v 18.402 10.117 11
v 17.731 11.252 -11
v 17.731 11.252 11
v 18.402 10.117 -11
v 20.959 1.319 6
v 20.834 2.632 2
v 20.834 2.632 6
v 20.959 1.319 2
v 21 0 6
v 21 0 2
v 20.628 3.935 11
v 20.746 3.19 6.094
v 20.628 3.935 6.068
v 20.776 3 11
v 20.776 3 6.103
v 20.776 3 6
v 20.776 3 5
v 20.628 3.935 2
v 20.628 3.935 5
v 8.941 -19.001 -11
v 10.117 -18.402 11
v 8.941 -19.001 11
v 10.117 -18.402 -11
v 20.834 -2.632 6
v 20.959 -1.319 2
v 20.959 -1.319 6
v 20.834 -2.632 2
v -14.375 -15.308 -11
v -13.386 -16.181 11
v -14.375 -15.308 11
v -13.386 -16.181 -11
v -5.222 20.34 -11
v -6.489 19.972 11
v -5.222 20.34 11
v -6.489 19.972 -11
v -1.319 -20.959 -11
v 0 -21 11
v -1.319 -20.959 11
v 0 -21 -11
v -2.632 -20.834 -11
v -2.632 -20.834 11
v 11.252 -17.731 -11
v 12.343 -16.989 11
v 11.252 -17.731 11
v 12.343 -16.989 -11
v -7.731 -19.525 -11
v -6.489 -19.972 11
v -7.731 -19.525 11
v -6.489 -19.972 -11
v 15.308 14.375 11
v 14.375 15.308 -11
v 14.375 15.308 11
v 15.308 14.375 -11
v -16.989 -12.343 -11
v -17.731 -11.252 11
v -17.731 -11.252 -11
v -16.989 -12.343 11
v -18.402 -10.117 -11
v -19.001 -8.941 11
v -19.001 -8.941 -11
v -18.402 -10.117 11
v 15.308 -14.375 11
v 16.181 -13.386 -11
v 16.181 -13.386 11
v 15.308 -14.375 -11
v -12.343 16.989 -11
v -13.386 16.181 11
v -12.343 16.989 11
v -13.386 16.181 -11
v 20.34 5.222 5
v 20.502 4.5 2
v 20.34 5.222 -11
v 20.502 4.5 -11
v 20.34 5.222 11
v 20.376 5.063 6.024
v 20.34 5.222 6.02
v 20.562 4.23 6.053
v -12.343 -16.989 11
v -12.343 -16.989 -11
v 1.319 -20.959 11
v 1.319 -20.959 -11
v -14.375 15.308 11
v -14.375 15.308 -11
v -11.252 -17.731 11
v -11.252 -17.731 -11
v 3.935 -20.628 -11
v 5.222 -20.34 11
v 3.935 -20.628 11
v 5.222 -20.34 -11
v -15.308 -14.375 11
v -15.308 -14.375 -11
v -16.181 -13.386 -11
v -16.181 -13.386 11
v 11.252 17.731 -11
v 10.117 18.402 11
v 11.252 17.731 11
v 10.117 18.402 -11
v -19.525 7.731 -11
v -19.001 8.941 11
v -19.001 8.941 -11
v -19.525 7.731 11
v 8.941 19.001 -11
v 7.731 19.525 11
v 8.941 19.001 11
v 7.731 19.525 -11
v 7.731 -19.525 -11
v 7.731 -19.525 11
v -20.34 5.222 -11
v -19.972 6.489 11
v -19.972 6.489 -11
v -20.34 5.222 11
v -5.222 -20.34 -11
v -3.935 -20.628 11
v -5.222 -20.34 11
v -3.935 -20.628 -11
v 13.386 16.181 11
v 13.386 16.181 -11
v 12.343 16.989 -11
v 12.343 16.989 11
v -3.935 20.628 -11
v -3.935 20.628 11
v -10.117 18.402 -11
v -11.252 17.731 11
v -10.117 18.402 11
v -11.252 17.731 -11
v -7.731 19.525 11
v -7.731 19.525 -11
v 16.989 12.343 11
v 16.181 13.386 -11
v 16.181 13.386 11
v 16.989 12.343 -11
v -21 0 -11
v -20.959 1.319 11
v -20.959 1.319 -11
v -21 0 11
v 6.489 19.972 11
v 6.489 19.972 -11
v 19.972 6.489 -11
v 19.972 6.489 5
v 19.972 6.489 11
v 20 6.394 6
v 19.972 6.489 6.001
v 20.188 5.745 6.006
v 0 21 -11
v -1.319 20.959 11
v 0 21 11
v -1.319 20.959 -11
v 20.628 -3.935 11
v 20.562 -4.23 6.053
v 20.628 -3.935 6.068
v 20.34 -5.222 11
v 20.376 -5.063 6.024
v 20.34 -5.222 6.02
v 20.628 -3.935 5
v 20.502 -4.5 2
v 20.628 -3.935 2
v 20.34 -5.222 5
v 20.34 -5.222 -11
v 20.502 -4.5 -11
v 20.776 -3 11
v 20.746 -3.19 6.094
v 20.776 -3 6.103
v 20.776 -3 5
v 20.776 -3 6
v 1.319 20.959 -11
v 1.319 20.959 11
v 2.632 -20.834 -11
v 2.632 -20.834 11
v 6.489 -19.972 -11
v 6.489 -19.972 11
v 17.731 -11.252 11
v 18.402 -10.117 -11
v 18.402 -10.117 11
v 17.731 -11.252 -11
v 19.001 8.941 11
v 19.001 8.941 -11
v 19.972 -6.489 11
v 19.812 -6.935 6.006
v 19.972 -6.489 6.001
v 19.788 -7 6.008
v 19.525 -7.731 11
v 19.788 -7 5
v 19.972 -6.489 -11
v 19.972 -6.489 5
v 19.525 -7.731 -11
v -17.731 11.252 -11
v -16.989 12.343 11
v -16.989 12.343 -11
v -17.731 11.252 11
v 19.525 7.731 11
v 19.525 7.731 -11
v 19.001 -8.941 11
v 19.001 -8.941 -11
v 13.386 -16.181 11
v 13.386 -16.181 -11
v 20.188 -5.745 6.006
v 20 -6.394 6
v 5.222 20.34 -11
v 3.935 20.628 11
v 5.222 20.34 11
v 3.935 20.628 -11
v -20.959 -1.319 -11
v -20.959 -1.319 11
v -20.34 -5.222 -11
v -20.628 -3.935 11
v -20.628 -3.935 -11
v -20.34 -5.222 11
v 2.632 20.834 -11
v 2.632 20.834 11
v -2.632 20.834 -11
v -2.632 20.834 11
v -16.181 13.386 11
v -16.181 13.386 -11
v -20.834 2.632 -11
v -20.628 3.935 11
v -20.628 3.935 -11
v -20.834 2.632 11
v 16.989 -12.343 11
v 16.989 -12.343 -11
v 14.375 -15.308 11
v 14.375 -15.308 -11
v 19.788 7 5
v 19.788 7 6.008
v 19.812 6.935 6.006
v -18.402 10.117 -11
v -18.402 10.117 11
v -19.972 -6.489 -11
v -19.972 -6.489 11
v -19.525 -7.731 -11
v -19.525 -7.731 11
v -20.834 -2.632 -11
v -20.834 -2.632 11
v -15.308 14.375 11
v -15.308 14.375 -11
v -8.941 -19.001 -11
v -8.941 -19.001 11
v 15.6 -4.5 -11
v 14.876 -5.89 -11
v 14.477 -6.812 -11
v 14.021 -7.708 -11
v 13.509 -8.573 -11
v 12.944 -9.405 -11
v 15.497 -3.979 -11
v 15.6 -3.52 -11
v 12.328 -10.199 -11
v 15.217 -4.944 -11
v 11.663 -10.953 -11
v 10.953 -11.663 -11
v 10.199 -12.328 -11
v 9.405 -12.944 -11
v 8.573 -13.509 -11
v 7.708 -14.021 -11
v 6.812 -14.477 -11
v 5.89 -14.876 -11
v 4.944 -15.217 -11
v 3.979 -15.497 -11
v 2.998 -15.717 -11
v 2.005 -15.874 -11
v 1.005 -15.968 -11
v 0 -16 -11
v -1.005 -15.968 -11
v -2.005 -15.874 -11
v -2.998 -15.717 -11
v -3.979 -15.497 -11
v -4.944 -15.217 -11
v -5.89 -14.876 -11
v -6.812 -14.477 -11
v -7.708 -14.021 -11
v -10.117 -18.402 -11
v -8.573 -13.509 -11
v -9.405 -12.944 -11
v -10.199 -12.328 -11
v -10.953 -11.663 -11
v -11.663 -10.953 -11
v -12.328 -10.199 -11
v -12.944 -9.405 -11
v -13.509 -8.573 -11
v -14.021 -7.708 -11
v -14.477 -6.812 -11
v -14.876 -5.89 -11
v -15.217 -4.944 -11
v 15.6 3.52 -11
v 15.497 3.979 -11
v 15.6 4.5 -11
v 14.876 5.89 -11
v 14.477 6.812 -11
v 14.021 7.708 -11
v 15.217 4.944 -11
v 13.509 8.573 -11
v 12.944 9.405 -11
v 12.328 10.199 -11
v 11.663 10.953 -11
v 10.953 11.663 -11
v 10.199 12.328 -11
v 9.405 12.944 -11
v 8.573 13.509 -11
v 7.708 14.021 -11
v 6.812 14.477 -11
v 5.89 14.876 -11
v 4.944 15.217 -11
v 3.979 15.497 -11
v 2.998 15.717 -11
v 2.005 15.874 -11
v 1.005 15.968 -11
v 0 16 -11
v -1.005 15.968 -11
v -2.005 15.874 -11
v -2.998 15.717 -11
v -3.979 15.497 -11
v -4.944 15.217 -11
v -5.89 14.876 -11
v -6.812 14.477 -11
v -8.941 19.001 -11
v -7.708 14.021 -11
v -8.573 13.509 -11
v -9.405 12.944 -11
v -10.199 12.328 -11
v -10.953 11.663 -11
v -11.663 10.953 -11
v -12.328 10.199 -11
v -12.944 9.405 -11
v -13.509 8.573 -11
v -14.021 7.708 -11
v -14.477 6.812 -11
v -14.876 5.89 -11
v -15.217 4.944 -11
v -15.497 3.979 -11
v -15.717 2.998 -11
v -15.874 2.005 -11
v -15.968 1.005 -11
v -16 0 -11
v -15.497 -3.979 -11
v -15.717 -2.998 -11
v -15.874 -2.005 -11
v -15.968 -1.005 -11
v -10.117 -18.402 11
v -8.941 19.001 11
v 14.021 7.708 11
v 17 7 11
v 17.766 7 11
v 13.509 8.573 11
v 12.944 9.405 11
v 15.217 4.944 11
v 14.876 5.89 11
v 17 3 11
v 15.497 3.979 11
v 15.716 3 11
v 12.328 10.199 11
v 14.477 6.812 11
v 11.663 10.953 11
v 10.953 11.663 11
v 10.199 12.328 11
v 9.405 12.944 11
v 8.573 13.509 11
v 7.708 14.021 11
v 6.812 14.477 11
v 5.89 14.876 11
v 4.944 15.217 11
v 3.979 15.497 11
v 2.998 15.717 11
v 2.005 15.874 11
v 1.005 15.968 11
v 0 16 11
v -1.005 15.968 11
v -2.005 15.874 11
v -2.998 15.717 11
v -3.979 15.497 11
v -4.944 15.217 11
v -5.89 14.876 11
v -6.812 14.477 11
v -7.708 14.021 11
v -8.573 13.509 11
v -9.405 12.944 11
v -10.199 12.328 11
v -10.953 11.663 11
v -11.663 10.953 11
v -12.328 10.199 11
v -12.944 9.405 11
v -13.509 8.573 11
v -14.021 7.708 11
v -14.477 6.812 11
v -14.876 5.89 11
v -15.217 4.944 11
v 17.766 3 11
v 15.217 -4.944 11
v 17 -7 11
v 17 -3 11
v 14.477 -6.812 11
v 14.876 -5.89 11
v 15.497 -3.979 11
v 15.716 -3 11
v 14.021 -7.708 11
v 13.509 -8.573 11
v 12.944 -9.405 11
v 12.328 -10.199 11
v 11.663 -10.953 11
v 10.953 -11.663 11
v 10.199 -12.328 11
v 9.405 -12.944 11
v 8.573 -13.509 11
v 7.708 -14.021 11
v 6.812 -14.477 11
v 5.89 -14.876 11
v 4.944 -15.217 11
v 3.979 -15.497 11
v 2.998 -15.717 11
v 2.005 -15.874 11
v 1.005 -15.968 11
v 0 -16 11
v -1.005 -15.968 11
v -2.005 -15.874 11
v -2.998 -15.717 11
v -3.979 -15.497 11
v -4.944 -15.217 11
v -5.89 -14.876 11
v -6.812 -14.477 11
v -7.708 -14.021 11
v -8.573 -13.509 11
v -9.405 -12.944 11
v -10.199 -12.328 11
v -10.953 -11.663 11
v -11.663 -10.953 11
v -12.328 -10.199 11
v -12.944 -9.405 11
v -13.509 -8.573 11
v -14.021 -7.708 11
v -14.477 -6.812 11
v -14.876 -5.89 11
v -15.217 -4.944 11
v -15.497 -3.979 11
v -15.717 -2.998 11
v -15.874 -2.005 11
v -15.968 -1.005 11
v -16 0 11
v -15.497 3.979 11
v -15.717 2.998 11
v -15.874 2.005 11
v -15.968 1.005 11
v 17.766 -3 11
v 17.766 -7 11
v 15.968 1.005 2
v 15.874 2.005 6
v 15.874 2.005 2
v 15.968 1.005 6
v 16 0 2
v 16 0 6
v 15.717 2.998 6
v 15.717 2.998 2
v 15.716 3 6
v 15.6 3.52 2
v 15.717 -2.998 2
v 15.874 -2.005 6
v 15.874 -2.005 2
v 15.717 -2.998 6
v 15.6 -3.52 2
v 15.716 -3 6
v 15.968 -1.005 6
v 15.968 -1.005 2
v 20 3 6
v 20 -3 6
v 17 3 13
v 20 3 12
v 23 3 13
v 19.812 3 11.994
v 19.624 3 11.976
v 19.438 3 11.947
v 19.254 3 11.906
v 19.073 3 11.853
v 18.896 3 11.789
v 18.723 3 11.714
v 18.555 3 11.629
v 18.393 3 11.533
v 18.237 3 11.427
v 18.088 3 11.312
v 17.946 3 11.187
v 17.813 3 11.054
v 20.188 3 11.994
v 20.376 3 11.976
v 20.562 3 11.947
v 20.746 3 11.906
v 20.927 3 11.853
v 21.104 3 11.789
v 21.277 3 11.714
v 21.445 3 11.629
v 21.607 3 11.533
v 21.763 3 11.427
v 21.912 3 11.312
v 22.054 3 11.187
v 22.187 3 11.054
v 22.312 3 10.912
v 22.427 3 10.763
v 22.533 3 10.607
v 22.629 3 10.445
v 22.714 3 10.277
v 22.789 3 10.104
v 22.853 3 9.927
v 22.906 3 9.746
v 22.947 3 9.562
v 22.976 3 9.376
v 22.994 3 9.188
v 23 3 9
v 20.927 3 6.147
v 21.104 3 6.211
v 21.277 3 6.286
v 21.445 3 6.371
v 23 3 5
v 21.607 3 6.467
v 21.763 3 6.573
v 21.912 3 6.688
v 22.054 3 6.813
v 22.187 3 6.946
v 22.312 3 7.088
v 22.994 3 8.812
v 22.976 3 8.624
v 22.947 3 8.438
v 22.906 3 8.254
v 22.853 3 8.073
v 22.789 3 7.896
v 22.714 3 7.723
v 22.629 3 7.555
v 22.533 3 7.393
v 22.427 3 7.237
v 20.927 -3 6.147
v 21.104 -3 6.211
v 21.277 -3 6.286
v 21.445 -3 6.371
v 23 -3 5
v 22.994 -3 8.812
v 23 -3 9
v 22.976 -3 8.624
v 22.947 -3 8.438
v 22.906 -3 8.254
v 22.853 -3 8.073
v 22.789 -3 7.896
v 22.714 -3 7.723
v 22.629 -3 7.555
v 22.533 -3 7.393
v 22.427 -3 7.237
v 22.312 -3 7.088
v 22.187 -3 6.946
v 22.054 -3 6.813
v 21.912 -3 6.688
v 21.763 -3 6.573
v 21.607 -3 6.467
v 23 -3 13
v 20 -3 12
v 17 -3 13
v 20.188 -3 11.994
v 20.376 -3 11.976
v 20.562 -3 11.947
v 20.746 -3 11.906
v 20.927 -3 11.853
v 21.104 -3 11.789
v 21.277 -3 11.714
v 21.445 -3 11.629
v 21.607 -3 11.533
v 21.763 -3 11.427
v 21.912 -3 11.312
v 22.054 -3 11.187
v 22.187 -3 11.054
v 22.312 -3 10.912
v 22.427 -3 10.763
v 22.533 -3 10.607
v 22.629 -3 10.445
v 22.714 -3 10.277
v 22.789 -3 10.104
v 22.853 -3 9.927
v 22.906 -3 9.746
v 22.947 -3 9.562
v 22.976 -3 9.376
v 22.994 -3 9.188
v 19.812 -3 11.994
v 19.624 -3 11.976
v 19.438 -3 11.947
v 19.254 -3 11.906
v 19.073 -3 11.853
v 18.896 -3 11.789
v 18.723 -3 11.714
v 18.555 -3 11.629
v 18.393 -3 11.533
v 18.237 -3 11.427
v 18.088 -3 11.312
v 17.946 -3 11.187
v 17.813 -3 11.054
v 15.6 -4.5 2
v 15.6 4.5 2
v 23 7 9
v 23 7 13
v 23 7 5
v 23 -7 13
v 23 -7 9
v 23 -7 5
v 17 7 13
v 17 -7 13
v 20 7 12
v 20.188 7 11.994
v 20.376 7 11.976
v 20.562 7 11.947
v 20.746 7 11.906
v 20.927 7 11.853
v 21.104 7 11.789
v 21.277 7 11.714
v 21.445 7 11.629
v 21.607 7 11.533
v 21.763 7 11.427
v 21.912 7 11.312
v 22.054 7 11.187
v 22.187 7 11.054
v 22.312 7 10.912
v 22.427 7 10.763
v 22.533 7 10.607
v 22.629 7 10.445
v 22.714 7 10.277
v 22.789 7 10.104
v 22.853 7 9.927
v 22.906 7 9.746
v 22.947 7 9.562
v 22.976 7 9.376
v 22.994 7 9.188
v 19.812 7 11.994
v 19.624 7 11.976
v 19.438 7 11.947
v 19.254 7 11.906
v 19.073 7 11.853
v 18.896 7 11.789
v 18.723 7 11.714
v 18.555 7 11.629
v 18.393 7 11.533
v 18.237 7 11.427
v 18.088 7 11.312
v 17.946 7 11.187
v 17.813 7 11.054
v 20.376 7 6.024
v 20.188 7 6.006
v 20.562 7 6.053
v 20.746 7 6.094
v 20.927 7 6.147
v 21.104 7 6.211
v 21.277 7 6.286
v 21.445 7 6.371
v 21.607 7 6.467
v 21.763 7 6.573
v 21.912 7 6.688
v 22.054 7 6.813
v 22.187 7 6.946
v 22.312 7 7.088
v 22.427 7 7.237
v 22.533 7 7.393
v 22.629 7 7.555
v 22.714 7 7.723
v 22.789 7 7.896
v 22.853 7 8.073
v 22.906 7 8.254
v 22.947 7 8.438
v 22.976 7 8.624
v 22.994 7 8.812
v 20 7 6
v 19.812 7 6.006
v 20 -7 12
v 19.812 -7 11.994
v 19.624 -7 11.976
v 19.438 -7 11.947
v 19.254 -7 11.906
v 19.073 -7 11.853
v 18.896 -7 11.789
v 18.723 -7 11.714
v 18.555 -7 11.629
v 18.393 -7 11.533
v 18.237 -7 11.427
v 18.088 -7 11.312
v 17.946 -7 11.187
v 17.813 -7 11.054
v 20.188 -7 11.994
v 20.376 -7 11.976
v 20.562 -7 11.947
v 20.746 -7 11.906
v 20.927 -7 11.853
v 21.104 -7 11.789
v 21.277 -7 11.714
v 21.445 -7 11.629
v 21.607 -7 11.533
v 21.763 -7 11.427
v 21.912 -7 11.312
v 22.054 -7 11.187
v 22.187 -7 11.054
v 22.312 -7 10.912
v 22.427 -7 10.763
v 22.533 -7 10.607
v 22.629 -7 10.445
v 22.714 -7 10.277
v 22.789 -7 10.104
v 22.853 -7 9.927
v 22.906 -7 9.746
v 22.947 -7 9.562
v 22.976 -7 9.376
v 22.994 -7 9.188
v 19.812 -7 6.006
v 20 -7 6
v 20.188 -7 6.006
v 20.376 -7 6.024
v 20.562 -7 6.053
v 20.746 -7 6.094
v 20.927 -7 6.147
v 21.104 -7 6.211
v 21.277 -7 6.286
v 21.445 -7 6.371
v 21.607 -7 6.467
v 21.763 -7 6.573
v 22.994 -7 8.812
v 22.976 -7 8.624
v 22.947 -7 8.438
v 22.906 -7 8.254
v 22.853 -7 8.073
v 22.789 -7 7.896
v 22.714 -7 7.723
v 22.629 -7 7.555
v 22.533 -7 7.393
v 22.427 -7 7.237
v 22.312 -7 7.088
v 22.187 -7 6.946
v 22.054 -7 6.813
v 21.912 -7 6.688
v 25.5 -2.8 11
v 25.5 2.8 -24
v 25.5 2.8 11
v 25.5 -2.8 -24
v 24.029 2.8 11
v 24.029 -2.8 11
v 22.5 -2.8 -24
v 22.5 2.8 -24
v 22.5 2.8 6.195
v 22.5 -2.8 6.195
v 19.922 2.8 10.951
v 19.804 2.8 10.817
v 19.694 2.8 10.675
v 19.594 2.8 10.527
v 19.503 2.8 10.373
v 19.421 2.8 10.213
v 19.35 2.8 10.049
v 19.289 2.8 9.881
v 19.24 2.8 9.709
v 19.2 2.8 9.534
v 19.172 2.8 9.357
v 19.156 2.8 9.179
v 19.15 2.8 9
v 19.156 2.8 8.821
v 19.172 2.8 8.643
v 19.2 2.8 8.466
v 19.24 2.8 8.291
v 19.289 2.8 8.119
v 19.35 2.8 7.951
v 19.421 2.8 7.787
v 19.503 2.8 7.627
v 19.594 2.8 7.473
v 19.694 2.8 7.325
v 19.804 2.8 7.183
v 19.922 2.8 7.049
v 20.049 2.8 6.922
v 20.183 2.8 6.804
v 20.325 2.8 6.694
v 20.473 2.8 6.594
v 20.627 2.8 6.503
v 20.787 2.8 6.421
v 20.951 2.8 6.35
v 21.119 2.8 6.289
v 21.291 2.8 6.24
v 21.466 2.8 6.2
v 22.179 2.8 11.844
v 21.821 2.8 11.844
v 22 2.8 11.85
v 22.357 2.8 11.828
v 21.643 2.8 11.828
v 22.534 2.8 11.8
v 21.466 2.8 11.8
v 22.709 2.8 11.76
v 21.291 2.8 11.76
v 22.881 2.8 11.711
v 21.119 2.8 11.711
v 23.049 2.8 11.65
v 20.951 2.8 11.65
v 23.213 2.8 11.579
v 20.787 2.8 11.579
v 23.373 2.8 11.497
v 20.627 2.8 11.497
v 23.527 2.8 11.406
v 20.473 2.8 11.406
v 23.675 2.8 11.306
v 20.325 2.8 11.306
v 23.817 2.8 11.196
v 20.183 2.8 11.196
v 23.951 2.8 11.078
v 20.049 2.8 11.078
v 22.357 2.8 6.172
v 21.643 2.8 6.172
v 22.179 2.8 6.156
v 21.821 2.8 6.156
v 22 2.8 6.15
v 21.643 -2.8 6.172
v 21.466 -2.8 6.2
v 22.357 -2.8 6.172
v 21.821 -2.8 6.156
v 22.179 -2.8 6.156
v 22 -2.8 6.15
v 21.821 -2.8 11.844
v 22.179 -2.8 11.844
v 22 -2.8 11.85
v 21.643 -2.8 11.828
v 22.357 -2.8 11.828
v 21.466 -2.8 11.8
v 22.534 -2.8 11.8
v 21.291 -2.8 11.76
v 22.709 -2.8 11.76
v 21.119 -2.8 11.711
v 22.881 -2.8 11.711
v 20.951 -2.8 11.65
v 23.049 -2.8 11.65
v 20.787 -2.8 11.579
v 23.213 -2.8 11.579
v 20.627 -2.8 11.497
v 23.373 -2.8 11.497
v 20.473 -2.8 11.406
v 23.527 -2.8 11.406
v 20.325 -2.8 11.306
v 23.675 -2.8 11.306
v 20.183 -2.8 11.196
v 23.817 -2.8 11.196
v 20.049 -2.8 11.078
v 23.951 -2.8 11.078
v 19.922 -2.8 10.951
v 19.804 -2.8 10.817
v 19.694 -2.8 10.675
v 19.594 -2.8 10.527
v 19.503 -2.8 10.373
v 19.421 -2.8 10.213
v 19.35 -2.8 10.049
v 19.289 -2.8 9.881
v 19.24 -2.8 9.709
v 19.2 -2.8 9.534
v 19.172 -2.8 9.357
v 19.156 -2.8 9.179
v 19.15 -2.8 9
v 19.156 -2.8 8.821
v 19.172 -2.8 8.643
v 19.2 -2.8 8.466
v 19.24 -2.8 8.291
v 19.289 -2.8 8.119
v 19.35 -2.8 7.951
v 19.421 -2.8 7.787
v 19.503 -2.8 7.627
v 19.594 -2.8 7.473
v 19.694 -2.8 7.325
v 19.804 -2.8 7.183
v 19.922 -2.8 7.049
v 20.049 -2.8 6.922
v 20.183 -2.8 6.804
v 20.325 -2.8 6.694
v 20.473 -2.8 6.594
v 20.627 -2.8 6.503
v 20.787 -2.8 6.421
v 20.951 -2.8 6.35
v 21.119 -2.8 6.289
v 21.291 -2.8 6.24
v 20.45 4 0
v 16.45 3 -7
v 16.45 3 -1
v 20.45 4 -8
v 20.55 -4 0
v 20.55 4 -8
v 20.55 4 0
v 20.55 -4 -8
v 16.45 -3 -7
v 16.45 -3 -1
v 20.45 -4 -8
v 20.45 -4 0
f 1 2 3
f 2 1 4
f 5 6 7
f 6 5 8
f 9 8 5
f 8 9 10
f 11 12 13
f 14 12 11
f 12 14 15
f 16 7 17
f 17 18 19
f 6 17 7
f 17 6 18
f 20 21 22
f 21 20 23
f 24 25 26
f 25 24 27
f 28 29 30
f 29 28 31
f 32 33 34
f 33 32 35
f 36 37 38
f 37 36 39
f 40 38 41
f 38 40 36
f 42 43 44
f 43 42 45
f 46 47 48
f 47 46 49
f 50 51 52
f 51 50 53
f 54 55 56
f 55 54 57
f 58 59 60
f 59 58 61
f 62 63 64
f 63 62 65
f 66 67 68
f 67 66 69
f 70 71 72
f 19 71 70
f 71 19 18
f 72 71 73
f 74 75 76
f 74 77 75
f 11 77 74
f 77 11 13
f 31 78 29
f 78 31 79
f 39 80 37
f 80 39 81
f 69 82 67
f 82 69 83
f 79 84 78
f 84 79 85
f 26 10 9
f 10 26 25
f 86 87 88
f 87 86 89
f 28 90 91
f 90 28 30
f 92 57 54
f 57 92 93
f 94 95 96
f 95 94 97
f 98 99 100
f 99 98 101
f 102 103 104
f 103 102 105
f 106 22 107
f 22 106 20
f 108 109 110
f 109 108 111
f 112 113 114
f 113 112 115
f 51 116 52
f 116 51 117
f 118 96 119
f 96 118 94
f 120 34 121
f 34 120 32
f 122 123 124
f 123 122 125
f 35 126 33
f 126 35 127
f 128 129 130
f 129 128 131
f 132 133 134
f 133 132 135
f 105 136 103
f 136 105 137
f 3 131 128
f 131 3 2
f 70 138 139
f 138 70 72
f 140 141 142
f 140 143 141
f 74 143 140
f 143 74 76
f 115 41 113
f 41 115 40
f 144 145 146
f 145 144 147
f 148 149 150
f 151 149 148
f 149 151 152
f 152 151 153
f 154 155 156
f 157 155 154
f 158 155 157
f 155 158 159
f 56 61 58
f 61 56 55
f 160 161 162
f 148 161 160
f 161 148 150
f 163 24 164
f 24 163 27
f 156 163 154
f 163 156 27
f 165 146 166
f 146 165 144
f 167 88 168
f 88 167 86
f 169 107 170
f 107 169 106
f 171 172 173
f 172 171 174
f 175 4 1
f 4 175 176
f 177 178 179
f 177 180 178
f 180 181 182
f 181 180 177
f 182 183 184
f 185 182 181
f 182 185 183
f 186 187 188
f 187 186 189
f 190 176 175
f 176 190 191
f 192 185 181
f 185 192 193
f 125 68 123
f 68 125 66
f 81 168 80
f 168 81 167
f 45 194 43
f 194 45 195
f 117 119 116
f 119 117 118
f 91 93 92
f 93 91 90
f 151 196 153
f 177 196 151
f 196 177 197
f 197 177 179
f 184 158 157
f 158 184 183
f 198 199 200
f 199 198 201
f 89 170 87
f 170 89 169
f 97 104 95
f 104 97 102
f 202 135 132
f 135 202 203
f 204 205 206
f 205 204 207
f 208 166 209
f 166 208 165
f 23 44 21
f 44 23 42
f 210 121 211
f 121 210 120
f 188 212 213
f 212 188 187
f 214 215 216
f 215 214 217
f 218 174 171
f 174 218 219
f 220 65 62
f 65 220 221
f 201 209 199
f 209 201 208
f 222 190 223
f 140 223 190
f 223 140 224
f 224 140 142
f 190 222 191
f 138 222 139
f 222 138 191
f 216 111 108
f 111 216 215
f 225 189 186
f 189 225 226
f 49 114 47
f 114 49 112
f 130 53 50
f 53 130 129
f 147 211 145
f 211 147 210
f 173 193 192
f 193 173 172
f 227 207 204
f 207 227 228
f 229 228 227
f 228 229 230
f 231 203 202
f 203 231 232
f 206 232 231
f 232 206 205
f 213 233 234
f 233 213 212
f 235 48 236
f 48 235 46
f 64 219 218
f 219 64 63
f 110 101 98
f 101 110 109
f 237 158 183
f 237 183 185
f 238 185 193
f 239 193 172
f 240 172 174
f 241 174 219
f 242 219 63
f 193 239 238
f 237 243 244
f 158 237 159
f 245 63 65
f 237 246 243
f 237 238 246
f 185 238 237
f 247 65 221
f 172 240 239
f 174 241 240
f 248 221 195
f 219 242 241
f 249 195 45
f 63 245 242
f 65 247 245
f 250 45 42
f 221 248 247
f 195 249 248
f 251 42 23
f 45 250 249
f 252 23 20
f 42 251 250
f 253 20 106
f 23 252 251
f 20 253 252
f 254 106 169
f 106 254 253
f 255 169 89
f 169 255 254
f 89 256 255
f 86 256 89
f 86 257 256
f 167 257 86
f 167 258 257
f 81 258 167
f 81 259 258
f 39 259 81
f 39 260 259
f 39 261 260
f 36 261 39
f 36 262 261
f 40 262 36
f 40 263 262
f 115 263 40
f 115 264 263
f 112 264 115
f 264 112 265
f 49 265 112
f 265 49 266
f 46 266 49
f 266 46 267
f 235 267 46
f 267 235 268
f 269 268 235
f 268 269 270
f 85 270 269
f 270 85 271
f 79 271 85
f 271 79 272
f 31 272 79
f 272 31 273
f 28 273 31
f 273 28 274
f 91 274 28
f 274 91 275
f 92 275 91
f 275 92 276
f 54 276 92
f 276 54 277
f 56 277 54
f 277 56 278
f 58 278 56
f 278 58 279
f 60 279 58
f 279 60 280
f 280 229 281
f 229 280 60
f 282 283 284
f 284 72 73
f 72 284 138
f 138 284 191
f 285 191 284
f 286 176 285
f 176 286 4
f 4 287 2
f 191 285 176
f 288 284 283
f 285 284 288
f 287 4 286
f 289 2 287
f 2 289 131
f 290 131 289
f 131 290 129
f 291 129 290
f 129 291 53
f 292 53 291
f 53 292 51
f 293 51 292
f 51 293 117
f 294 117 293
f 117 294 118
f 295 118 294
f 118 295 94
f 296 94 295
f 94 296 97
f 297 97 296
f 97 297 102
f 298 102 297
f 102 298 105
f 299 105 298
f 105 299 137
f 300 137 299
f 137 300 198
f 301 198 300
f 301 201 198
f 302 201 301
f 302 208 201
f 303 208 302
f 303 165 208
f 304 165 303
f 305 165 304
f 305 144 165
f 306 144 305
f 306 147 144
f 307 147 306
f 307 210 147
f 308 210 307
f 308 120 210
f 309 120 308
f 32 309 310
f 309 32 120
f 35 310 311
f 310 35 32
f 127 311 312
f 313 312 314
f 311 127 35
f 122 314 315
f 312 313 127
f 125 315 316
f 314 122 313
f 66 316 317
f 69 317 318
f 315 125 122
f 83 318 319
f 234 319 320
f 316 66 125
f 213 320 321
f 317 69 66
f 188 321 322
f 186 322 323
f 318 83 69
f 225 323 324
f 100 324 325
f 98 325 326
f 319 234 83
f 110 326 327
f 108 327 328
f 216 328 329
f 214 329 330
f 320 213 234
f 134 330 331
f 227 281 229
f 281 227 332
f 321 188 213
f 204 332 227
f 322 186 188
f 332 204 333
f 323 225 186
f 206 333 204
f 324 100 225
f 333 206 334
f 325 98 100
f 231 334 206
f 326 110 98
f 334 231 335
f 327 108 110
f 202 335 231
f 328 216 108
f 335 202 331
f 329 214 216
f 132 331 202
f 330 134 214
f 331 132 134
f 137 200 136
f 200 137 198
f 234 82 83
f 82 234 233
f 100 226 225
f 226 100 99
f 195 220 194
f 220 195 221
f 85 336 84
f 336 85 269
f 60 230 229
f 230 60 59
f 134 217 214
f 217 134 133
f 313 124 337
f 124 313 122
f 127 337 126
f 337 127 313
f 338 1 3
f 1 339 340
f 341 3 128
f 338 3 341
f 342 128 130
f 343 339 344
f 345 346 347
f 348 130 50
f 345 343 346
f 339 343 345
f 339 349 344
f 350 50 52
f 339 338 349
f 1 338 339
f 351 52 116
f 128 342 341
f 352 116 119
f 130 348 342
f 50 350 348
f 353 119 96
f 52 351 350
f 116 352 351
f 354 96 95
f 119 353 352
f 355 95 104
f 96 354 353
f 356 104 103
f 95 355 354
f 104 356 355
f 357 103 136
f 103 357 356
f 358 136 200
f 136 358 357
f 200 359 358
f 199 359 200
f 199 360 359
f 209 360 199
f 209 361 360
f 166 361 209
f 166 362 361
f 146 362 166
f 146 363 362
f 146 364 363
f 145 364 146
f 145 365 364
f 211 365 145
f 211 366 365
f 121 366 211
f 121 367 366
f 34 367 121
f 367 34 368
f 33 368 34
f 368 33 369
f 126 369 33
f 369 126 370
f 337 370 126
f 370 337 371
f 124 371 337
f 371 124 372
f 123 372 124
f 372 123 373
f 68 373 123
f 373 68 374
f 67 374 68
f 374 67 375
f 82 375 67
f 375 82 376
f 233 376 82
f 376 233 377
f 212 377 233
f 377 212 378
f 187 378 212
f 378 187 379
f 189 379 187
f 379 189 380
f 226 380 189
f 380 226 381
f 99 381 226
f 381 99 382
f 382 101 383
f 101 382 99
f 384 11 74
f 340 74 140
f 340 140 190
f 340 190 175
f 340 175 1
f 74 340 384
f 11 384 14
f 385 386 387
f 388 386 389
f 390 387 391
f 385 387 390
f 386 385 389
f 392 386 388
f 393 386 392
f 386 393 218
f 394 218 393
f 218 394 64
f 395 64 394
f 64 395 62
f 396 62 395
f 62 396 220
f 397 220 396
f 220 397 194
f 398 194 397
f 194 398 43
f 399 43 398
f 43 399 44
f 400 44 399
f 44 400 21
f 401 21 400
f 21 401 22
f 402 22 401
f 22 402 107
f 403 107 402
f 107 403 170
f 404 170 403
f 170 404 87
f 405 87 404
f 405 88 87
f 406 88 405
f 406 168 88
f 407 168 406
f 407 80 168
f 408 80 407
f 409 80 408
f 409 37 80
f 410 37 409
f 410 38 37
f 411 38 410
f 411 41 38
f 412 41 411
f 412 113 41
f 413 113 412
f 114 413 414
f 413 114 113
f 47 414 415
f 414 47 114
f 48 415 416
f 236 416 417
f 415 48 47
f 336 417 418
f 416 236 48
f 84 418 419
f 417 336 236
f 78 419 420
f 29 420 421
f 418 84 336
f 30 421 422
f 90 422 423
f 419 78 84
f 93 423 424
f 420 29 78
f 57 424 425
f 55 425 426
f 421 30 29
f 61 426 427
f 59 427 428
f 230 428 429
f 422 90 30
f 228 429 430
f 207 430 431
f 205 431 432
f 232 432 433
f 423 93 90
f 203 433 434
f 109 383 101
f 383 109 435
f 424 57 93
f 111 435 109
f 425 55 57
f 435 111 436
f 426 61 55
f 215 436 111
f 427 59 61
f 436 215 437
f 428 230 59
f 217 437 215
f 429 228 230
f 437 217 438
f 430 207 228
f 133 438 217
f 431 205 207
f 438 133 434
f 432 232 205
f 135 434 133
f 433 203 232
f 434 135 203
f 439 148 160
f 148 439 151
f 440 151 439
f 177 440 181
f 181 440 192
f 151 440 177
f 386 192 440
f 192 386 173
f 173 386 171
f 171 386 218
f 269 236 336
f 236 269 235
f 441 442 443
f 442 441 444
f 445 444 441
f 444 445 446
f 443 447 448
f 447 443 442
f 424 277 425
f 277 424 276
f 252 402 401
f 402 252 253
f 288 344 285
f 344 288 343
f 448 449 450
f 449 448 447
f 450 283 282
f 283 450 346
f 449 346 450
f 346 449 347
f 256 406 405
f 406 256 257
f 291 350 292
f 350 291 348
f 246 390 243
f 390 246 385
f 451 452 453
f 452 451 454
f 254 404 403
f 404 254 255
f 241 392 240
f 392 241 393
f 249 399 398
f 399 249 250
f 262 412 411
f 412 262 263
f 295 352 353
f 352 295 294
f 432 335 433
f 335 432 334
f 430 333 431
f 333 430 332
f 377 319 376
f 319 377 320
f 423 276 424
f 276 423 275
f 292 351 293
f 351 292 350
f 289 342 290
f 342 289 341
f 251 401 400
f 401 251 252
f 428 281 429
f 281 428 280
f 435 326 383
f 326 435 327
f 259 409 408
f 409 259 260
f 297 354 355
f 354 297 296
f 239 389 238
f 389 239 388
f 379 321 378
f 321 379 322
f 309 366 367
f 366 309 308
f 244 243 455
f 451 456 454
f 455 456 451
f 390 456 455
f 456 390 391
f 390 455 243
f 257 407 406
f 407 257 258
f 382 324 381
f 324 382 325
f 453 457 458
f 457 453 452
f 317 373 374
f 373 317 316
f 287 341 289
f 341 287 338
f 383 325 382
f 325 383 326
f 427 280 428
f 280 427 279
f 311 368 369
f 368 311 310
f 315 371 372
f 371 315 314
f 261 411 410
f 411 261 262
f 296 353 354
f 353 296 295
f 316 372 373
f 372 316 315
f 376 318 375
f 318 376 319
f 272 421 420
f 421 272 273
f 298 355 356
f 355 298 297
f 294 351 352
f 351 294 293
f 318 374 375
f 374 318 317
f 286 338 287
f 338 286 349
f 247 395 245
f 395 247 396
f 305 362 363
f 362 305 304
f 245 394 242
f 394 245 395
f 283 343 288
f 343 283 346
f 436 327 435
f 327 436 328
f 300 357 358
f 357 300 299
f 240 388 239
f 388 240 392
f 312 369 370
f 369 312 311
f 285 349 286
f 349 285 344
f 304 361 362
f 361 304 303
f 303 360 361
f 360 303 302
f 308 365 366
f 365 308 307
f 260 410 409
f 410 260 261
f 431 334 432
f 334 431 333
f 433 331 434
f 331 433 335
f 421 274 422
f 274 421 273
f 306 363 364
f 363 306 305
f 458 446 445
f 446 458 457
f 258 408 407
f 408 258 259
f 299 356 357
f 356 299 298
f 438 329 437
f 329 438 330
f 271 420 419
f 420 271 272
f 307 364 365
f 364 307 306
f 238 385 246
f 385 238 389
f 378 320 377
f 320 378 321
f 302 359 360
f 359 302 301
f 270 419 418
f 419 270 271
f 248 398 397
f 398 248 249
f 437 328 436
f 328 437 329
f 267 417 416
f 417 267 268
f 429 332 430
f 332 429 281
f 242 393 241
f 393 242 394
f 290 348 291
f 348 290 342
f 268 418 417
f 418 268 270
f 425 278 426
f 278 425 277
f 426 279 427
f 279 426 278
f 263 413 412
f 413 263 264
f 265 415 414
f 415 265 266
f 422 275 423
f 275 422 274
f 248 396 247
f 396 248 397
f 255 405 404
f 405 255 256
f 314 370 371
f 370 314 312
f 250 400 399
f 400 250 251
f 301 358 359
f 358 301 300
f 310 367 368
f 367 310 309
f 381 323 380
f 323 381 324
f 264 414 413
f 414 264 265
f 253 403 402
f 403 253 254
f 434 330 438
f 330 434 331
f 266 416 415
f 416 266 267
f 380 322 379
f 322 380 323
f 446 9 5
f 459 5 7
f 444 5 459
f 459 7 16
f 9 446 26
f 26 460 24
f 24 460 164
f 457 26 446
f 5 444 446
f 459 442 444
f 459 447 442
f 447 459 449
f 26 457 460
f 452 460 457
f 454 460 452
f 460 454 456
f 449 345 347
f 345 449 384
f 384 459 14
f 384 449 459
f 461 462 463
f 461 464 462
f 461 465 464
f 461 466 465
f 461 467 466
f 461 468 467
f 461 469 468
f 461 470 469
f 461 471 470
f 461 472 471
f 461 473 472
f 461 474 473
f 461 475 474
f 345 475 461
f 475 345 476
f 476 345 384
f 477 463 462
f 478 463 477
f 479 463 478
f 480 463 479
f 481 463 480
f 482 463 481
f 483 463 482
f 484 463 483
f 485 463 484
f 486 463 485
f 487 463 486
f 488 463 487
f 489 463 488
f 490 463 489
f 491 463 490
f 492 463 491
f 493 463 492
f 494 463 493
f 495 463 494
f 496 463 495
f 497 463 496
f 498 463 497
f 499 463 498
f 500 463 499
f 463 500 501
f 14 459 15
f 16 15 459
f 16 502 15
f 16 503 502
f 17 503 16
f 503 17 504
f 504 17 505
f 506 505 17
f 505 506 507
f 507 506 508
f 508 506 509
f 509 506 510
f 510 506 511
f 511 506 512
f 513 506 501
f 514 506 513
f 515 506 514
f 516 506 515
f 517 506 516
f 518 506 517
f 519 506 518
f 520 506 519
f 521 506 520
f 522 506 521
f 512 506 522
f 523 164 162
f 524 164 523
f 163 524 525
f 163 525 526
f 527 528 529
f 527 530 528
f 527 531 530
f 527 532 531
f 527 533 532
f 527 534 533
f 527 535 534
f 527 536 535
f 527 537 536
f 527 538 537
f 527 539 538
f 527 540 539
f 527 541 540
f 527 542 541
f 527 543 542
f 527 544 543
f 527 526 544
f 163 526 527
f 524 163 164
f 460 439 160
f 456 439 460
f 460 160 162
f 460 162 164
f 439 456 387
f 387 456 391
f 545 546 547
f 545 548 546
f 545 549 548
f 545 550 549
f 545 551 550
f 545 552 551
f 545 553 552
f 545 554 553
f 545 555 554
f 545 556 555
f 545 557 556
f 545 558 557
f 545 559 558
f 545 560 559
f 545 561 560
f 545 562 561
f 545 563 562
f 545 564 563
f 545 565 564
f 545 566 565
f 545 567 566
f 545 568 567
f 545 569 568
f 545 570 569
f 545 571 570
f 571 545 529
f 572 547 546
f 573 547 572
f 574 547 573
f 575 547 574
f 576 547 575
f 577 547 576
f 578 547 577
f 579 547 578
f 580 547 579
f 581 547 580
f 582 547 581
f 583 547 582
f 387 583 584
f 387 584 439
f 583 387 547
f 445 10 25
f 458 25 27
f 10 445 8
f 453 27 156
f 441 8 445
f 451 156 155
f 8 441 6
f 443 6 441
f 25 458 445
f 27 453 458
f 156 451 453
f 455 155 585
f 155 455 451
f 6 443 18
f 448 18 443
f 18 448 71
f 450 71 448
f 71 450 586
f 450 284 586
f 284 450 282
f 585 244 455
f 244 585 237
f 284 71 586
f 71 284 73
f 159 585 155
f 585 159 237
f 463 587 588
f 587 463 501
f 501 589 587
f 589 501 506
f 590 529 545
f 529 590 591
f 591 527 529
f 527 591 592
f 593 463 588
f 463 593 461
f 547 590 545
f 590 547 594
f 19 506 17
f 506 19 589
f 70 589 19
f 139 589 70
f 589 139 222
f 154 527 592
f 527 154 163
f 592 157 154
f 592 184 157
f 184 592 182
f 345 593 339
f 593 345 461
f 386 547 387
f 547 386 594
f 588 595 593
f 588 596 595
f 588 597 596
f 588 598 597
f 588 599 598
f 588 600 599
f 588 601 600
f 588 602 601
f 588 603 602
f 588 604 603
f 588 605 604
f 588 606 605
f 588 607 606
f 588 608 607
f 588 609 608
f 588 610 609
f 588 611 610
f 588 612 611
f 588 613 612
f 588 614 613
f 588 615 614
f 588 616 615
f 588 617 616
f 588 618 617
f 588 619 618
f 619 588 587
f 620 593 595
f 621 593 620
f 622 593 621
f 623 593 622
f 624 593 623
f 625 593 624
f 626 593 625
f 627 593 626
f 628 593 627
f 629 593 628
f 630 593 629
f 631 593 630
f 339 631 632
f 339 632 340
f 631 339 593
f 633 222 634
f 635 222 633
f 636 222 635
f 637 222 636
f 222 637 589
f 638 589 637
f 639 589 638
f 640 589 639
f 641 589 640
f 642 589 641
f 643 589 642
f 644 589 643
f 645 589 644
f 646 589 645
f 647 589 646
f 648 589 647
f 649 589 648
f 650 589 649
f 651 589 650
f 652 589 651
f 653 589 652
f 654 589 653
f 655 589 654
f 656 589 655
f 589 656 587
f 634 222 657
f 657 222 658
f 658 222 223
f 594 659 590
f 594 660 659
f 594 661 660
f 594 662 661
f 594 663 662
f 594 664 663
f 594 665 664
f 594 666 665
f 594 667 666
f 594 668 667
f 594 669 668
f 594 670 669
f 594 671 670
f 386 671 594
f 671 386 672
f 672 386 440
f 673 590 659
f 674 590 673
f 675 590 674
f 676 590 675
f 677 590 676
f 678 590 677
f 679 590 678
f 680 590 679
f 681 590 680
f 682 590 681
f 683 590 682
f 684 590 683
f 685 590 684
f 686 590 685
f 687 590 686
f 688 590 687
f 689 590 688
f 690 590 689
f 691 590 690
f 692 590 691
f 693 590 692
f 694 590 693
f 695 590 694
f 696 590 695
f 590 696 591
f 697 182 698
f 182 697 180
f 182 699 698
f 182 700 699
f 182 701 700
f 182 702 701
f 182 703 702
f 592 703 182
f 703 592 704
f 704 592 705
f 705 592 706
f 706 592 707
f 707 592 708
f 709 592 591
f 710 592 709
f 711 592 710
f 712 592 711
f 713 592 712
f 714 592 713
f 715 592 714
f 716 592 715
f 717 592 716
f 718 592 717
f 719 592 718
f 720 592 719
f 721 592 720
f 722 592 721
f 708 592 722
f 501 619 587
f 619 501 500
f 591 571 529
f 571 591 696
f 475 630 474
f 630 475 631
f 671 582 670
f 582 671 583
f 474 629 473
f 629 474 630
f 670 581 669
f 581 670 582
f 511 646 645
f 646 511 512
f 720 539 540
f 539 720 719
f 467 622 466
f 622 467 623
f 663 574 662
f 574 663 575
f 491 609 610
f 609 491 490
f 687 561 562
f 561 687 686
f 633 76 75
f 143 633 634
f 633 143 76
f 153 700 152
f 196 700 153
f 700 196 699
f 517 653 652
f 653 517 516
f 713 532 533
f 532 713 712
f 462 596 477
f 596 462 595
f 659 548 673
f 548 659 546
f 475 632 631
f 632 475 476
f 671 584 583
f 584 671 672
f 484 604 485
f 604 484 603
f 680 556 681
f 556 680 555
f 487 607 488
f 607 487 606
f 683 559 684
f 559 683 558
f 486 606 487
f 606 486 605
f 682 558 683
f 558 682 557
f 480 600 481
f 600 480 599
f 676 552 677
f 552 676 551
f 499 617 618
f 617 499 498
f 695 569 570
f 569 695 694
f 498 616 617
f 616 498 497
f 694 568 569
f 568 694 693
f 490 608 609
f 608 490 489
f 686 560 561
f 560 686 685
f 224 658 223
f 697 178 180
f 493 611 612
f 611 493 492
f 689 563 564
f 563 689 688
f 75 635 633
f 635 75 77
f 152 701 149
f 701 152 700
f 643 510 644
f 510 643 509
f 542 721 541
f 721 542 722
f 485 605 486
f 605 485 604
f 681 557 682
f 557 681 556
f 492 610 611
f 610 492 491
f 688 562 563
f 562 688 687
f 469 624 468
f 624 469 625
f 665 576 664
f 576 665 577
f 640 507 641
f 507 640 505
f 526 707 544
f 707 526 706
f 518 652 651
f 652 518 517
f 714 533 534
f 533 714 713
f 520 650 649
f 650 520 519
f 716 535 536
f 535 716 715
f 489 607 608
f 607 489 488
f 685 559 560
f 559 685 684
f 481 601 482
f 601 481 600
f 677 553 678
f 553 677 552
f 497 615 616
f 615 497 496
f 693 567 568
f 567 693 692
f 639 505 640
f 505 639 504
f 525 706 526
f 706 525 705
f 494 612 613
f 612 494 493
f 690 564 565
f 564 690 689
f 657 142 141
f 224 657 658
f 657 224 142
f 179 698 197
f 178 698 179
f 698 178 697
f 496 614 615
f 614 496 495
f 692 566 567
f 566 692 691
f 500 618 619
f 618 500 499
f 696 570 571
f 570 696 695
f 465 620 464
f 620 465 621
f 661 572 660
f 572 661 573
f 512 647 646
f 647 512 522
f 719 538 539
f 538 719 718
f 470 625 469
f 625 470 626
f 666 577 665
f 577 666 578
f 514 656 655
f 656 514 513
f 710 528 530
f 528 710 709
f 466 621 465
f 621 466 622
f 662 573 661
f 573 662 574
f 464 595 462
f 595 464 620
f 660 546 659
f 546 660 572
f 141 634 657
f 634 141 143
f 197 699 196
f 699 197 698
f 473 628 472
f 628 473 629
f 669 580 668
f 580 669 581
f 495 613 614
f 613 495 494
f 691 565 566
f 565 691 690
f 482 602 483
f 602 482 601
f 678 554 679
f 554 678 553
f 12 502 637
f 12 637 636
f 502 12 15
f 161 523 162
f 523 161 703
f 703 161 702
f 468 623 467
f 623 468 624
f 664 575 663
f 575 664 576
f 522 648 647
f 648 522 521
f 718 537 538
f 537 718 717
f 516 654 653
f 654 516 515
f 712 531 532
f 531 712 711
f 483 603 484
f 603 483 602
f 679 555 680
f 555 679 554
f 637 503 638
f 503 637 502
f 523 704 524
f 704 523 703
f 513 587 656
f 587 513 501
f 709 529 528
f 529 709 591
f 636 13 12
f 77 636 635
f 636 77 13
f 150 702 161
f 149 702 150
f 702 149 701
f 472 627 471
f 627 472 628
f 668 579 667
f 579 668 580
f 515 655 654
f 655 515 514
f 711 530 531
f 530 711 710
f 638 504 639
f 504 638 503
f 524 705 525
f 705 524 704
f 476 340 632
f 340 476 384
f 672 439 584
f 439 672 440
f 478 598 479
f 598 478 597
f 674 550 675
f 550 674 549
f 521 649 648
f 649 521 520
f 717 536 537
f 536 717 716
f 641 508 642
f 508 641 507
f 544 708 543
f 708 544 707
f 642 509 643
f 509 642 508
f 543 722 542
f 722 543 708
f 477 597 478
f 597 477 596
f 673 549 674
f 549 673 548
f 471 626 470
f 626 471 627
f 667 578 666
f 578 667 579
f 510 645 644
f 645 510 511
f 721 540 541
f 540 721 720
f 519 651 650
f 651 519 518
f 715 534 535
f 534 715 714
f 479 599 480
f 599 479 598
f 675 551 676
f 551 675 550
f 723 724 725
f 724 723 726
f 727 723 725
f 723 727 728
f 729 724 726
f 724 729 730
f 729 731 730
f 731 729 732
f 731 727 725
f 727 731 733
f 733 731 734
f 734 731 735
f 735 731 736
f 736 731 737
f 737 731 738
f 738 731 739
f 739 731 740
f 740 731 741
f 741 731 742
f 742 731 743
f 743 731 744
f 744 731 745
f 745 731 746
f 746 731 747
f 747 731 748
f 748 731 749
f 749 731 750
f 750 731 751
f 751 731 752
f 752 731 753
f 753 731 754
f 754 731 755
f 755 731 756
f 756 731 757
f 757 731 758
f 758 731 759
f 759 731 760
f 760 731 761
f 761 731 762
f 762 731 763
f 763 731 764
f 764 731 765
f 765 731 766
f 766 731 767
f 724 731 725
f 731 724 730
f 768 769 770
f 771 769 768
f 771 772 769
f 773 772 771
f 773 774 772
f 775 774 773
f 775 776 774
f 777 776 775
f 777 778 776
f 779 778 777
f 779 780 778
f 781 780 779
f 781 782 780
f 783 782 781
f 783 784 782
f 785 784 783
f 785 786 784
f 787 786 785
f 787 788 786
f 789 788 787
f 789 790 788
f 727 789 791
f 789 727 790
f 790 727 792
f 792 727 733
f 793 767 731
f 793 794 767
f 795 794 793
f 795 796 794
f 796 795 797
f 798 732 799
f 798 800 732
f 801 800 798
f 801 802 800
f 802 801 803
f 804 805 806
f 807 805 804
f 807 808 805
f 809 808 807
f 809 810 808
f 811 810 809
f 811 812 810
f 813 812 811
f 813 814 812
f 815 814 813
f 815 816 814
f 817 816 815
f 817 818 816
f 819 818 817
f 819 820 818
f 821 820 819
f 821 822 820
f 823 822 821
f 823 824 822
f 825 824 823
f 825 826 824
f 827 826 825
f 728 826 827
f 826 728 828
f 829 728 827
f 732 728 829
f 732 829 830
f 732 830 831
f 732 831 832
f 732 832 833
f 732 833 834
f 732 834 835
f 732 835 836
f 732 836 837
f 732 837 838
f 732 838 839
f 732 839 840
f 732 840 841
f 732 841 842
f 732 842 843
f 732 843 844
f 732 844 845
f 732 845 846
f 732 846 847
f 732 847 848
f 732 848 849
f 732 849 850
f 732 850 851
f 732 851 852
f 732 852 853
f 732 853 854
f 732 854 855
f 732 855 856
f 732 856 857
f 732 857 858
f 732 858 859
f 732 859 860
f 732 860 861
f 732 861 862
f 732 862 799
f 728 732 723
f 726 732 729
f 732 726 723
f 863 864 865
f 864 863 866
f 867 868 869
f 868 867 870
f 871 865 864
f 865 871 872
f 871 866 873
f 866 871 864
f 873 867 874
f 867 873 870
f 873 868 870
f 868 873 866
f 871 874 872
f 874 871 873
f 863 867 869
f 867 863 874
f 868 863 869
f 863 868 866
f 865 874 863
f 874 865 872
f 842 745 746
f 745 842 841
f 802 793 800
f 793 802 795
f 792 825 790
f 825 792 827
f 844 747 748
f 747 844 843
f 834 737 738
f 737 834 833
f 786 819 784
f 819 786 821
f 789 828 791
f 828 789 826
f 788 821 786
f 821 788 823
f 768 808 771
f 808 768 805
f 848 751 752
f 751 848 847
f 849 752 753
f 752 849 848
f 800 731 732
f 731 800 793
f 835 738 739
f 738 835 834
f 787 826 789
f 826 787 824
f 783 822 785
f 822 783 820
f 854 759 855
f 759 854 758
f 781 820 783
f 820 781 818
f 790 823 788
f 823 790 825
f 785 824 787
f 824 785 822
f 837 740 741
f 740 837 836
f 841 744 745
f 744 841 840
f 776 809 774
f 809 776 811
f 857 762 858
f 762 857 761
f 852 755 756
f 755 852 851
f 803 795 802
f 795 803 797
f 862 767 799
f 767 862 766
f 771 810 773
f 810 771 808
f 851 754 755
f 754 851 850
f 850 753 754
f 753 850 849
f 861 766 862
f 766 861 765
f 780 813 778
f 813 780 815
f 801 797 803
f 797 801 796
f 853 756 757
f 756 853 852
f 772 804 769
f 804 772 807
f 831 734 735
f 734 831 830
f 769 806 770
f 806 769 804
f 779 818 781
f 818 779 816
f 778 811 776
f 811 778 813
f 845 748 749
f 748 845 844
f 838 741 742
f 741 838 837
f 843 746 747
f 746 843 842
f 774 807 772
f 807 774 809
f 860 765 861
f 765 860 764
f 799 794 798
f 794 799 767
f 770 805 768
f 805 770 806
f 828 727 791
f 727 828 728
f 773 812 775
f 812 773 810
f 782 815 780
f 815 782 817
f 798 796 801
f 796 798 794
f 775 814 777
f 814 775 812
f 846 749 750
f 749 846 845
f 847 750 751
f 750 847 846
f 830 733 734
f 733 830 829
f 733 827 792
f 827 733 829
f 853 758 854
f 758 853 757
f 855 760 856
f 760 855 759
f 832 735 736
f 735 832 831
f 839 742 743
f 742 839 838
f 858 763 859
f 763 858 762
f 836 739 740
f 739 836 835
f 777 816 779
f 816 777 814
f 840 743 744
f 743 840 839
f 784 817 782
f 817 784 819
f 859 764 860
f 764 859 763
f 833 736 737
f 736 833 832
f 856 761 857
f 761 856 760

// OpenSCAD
// Насадка под Supra VCS-1832
$fn = 100;

// Размеры корпуса
id_tube = 32;       // Внутренний диаметр
od_tube = 42;       // Внешний диаметр
len_tube = 22;      // Общая длина корпуса
wall = 3;           // Толщина стенки корпуса (минимальная 2.5-3)

// Размеры рычага и фиксатора
lever_length = 35;
axis_slot_w = 6;
axis_d = 5.7;
bump_h = 4;
bump_w = 8;
slot_w = 9;
slot_d = 4.5;

module housing() {
    difference() {
        // Основной корпус
        cylinder(d=od_tube, h=len_tube, center=true);

        // Внутреннее отверстие под трубу
        cylinder(d=id_tube, h=len_tube + 2, center=true);

        // Паз под ось рычага (6 мм ширина) - сверху
        translate([od_tube/2 - 2, 0, len_tube/2])
            cube([10, axis_slot_w, 10], center=true);

        // Паз под фиксатор (ширина 9, глубина 4.5) - снизу рычага
        translate([od_tube/2 - slot_d/2 + 0.1, 0, -len_tube/4])
            cube([slot_d + 2, slot_w, 15], center=true);
    }

    // Крепления оси на корпусе
    translate([od_tube/2 - 1, 0, len_tube/2 - 2]) {
        difference() {
            cube([6, 14, 8], center=true);
            cube([7, axis_slot_w, 10], center=true);
            rotate([90, 0, 0]) cylinder(d=axis_d + 0.3, h=16, center=true);
        }
    }
}

module lever() {
    // Рычаг расположен в рабочем положении (собранный вид)
    translate([od_tube/2 + 1, 0, len_tube/2 - 2]) {

        // Ось рычага (5.7 мм)
        rotate([90, 0, 0]) cylinder(d=axis_d, h=axis_slot_w - 0.4, center=true);

        // Тело рычага (длина 35 мм)
        translate([2, 0, -lever_length/2 + 2]) {
            cube([3, axis_slot_w - 0.4, lever_length], center=true);

            // Выступ-фиксатор (высота 4, ширина 8)
            // Он должен входить в паз корпуса
            translate([-1.5 - bump_h/2, 0, lever_length/2 - 15]) {
                // bump_h = 4, bump_w = 8
                // Сделаем бугорок скругленным
                hull() {
                    cube([0.1, bump_w, bump_w], center=true);
                    translate([-bump_h, 0, 0]) cube([0.1, bump_w-2, bump_w-2], center=true);
                }
            }
        }
    }
}

// Сборка для визуализации
housing();
color("red") lever();
